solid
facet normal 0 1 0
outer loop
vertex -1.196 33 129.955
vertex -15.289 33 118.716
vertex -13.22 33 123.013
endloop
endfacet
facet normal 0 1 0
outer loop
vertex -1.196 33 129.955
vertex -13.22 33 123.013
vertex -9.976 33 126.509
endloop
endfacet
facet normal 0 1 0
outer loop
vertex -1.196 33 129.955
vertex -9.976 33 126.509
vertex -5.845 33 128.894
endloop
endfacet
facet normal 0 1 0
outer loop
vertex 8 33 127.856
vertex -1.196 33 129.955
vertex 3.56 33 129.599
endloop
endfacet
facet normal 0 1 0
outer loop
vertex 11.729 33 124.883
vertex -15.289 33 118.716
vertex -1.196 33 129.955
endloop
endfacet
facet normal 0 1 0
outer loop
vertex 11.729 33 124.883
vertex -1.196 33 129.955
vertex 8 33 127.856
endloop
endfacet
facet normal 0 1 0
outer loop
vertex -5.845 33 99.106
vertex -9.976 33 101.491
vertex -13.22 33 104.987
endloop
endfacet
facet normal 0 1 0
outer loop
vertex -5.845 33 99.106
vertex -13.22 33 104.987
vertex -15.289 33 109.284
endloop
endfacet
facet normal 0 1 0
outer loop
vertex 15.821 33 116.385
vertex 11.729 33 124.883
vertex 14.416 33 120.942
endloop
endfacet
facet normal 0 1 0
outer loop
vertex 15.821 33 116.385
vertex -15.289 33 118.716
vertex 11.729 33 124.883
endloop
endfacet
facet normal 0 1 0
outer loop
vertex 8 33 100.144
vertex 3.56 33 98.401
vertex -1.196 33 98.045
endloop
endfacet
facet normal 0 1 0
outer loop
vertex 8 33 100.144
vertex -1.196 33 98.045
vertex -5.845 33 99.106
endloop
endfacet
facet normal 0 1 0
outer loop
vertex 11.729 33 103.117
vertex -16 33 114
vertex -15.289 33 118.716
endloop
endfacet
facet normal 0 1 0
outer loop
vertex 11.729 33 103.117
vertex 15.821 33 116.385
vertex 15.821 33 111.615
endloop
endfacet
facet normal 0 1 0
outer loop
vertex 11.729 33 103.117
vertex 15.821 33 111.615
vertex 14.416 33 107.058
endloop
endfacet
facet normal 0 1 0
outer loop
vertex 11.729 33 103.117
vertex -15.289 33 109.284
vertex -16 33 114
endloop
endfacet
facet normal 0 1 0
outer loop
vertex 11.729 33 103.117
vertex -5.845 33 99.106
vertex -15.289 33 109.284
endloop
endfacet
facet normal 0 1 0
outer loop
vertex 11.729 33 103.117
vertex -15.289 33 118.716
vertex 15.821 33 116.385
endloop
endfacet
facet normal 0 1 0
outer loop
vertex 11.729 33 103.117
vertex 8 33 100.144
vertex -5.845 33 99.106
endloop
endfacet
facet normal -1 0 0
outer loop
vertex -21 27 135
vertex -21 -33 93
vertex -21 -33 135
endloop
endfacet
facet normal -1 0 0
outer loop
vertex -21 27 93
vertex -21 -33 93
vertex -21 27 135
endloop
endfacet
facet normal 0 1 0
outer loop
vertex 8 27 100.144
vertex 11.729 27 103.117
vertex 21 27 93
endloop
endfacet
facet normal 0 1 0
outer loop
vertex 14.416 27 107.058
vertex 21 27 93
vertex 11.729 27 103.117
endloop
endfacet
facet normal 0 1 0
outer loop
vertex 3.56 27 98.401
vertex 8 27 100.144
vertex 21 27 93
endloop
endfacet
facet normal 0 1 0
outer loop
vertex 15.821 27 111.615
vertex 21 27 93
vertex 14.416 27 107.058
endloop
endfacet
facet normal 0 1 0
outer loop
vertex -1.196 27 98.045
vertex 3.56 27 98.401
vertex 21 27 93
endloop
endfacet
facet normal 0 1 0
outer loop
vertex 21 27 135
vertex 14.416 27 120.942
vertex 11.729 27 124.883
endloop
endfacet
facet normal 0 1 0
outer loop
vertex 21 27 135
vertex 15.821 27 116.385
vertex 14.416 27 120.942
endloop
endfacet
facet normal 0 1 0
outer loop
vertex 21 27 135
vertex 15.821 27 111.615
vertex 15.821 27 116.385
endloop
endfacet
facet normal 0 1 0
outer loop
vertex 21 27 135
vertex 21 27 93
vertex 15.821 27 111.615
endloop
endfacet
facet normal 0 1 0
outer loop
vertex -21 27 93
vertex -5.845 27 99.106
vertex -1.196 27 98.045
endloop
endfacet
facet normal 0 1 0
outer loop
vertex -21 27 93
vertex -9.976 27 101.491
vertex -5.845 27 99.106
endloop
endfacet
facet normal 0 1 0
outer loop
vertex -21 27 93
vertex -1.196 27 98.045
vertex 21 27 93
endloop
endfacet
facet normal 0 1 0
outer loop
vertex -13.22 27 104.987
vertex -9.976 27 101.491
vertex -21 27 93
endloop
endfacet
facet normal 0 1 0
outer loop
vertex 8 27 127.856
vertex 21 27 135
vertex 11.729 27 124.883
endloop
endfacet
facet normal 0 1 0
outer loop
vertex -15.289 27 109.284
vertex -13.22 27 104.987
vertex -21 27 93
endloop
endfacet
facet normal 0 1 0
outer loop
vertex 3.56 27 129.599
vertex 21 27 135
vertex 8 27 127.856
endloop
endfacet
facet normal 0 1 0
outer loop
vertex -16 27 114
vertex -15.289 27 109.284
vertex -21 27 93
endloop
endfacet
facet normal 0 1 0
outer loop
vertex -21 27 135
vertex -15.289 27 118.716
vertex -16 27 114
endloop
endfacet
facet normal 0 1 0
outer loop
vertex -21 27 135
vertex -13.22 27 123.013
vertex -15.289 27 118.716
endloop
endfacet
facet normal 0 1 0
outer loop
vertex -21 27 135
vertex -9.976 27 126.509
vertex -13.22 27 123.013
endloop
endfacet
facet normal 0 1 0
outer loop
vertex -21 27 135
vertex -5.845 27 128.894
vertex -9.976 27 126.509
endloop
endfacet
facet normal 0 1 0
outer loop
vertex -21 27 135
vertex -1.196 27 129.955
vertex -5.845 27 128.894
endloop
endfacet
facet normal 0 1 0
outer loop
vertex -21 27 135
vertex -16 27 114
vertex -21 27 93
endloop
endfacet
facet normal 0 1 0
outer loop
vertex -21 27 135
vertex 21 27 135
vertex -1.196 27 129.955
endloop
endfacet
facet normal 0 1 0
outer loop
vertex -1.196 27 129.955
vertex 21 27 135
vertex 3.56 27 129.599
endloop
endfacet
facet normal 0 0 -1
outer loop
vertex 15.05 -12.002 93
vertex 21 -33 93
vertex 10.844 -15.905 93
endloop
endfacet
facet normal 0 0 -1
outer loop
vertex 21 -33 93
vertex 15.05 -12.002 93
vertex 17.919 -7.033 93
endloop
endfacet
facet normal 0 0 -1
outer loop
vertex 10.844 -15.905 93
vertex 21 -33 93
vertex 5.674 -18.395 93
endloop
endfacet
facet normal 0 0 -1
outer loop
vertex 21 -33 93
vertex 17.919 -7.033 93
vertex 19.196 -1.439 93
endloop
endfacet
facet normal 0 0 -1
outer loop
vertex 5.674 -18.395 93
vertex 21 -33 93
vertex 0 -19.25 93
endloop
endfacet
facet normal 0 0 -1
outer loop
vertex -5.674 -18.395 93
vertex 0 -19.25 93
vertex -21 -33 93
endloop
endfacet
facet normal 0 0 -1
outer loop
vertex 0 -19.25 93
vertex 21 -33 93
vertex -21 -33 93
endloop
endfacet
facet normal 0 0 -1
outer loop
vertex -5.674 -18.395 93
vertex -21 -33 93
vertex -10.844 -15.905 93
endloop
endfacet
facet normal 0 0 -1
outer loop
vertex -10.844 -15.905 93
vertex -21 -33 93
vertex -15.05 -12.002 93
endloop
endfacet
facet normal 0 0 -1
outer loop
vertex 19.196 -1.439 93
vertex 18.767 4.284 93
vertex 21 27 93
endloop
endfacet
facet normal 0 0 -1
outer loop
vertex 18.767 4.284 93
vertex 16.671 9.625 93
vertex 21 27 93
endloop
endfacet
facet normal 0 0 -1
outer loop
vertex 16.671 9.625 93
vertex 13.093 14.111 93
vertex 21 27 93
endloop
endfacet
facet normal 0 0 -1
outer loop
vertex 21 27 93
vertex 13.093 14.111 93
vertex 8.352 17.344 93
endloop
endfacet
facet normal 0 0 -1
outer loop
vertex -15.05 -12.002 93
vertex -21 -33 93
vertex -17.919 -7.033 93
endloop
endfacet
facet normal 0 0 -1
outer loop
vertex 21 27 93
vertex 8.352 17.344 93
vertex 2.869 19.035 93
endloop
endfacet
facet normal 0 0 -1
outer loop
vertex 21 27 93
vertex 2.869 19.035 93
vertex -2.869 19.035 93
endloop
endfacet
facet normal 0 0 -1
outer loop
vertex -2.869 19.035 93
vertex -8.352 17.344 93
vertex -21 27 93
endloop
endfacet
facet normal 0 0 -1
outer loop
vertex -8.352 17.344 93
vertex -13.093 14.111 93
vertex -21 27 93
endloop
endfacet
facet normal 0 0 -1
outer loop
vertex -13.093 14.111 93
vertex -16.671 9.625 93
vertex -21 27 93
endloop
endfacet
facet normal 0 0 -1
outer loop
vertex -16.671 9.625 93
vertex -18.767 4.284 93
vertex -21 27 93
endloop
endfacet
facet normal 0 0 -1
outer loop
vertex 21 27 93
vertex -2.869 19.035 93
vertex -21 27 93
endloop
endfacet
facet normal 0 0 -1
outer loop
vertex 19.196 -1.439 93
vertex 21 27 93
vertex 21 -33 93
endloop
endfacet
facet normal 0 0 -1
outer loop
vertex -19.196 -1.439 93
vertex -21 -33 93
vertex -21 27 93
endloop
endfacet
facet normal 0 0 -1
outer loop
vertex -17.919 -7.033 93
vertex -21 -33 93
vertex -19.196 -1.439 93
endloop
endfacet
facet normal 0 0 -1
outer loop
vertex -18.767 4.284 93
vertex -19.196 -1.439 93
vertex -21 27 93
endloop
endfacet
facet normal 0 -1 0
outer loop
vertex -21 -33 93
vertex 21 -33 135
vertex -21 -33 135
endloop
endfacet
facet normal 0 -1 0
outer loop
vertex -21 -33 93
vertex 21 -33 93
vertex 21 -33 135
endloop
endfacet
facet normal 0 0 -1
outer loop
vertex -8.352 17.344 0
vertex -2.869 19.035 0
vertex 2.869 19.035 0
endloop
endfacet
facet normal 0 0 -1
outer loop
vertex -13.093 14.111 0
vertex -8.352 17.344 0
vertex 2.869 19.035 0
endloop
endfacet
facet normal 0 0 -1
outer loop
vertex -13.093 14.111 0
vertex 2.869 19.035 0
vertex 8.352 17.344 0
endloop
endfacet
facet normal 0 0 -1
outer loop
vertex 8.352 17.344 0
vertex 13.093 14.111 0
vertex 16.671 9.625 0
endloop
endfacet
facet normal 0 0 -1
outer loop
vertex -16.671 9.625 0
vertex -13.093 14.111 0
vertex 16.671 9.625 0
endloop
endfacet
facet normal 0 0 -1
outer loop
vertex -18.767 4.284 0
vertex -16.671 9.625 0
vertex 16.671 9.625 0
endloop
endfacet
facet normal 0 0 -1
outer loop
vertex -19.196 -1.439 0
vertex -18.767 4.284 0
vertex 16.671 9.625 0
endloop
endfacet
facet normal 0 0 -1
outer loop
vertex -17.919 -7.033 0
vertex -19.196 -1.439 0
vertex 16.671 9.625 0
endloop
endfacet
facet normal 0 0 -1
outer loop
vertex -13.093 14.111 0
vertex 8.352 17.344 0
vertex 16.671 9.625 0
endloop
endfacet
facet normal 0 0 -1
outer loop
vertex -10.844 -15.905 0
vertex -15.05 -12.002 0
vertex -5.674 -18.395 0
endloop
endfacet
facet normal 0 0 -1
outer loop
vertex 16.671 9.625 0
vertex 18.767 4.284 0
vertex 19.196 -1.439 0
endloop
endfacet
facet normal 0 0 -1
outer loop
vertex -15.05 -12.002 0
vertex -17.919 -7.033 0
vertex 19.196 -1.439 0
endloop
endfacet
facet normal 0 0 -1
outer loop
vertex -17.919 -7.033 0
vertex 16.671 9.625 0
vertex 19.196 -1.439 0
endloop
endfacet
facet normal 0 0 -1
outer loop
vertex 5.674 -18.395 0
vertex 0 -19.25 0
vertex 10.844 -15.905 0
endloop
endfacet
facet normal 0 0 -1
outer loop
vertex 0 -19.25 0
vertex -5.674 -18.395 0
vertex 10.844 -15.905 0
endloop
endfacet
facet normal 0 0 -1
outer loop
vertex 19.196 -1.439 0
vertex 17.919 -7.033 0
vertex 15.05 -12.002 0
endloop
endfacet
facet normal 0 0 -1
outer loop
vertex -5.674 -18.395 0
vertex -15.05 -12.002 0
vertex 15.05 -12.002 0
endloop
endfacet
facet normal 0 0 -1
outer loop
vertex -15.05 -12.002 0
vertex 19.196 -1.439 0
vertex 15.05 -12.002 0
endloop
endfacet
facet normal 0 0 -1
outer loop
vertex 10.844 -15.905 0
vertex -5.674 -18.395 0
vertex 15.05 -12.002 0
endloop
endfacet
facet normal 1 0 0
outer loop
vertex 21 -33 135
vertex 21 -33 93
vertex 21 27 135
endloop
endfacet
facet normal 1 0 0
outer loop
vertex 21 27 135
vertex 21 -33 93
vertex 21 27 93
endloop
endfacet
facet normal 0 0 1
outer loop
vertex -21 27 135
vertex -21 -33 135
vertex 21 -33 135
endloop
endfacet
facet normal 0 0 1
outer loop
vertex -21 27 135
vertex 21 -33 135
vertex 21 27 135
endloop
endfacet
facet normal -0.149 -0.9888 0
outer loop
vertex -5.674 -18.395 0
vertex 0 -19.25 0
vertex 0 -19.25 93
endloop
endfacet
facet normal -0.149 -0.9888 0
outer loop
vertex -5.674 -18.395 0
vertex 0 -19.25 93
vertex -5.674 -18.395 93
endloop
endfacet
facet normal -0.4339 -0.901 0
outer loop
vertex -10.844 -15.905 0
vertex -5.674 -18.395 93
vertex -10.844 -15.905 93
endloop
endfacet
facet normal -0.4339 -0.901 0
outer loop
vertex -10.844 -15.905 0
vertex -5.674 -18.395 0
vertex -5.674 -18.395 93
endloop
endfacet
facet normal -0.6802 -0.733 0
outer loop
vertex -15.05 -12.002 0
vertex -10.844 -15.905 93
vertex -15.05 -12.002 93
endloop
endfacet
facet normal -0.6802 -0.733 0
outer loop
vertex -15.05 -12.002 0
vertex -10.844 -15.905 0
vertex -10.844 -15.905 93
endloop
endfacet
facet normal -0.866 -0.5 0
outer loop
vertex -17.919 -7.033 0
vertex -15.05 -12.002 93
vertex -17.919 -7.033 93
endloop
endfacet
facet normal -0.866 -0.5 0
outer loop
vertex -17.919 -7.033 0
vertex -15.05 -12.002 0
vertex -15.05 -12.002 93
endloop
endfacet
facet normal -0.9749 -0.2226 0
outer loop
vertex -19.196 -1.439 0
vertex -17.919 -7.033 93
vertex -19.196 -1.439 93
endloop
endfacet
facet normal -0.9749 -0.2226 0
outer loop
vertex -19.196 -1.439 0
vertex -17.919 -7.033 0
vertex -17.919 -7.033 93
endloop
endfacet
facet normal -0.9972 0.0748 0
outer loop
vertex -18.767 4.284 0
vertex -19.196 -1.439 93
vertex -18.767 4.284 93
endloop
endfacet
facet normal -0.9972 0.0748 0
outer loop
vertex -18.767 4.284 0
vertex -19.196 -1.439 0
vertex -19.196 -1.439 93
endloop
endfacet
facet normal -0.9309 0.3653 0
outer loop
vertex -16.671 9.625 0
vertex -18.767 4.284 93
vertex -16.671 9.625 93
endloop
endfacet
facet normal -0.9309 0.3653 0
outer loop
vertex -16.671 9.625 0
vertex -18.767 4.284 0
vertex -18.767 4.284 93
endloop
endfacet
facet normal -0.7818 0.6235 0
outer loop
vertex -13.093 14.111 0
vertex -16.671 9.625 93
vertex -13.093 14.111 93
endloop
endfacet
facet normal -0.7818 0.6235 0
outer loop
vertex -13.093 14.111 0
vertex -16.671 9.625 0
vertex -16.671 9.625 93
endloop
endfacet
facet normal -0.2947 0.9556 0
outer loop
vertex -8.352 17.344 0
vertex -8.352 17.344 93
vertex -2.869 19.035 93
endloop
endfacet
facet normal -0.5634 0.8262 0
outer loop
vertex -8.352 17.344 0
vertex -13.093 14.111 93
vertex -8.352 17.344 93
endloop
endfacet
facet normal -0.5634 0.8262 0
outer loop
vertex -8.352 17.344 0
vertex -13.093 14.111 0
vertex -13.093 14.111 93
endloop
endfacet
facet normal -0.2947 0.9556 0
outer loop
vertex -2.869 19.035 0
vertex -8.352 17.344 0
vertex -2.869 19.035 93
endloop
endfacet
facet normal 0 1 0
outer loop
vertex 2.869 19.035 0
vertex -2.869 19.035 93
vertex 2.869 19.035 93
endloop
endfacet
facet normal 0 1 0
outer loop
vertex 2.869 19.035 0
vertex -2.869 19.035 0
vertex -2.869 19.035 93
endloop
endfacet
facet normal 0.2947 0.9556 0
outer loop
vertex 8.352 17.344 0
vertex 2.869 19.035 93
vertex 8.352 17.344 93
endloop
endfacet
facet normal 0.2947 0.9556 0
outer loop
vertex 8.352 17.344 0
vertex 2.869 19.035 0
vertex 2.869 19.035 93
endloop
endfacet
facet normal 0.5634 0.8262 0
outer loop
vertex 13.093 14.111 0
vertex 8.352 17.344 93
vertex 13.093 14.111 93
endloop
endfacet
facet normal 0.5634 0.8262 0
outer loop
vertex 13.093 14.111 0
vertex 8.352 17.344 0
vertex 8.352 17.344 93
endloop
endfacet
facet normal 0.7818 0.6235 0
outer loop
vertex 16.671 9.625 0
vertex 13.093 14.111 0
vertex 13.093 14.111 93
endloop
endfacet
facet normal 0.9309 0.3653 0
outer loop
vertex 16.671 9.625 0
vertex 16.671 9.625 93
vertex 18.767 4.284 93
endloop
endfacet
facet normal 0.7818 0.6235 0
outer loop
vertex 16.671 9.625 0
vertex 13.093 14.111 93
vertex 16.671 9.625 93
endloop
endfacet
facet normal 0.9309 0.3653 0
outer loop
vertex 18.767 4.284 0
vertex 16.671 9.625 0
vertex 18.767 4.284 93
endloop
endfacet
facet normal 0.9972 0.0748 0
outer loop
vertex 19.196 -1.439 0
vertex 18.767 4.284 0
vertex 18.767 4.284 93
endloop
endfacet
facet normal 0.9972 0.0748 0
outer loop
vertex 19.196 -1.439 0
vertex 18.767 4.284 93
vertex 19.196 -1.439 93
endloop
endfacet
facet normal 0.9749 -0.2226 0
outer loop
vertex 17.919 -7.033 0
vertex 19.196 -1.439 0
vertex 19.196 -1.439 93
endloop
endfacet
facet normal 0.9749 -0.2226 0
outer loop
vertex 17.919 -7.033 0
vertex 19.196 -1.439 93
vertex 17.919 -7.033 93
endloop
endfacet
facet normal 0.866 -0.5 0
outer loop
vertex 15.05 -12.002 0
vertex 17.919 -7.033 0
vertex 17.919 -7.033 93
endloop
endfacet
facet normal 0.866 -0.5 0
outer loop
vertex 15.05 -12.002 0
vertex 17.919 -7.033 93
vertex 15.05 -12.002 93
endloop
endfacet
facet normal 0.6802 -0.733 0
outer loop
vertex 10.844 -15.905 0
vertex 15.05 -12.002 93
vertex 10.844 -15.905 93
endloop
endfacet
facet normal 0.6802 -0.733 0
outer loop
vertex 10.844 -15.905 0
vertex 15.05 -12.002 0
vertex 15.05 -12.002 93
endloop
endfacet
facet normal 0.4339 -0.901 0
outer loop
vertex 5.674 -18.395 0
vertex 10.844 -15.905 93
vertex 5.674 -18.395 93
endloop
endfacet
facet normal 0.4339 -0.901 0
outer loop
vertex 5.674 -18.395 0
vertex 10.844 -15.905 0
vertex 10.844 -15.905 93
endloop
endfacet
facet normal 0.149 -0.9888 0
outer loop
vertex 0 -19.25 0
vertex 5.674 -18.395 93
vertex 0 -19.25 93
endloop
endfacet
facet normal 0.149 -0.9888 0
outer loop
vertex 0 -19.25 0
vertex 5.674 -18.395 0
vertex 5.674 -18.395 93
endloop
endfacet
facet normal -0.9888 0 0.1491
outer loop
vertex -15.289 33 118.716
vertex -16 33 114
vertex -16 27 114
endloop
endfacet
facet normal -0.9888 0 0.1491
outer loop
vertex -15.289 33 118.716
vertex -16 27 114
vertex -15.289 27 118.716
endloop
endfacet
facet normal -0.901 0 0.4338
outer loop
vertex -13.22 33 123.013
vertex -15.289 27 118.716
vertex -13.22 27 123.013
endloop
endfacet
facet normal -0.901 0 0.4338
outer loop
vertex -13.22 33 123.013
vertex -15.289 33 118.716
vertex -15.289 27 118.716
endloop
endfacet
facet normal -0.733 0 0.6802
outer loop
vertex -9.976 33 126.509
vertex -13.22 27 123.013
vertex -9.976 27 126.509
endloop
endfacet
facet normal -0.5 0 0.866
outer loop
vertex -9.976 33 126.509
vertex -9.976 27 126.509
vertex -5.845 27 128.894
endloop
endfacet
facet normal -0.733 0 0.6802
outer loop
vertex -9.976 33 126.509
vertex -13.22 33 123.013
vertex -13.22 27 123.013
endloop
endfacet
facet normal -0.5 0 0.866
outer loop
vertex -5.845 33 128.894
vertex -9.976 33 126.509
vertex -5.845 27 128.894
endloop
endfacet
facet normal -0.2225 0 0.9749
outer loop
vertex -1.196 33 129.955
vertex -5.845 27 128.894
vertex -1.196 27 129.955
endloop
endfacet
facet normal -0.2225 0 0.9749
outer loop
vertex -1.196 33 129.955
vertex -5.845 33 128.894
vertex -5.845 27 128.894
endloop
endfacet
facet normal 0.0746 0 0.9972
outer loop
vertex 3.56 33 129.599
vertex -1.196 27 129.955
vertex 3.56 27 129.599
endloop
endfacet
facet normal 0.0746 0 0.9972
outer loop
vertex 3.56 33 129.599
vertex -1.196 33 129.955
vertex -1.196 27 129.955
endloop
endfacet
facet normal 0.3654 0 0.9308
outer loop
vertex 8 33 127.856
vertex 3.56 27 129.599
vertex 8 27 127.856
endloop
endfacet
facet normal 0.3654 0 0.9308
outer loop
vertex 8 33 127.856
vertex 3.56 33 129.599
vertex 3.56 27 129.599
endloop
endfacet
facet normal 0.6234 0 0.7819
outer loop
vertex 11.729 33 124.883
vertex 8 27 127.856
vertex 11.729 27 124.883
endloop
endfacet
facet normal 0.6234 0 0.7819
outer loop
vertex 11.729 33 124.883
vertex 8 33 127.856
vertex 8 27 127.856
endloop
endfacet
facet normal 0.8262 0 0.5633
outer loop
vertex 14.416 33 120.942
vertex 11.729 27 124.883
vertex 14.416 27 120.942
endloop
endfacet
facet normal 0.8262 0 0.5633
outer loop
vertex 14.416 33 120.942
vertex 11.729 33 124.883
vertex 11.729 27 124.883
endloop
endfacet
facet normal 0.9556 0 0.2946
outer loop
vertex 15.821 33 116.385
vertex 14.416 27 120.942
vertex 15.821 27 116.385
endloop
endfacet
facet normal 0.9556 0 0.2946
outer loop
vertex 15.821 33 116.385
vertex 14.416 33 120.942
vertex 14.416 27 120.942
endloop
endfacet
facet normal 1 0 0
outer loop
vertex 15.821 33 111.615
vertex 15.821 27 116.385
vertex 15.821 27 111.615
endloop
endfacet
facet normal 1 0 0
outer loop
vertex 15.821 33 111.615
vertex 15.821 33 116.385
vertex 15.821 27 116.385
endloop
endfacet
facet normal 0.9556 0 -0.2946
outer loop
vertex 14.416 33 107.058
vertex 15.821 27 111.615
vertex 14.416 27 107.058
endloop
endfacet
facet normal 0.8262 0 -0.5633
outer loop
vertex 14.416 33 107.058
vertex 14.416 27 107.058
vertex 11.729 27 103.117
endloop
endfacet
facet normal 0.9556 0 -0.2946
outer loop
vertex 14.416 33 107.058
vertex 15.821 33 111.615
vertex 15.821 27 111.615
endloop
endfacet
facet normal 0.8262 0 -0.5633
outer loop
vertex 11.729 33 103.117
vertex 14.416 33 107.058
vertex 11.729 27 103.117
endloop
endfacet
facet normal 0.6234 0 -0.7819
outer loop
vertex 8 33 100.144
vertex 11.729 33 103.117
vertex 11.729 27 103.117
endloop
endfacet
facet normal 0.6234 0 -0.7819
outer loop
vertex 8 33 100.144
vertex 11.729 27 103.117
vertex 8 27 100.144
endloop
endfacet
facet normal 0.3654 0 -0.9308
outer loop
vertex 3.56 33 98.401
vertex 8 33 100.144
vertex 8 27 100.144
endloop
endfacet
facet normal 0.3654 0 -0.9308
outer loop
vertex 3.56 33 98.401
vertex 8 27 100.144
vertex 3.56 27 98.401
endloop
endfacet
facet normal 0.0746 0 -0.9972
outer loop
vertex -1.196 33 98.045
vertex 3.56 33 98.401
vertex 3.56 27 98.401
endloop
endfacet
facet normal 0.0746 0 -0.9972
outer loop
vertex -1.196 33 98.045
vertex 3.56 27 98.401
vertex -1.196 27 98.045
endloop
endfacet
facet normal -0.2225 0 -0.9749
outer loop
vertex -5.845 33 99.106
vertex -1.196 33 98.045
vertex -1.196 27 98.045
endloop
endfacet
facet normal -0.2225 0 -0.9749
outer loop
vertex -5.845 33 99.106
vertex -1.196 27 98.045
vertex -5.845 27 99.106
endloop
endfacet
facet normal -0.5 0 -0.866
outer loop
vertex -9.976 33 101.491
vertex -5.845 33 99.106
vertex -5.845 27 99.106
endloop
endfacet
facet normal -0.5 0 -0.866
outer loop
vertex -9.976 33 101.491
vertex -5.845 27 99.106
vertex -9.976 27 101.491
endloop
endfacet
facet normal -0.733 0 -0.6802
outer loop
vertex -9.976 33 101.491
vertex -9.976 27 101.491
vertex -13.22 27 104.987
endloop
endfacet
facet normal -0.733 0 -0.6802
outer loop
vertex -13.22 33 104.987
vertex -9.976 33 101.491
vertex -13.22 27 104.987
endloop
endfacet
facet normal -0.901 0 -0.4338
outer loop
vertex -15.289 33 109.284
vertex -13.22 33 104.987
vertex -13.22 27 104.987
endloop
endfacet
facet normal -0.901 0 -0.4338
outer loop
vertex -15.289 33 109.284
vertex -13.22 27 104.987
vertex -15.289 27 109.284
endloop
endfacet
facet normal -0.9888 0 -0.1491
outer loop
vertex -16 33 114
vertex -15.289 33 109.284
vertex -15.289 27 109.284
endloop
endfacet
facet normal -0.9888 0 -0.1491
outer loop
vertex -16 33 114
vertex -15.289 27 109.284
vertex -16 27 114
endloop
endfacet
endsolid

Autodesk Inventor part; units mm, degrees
ref_plane "YZ Plane" through (0, 0, 0) normal (1, 0, 0) x (0, 1, 0)
ref_plane "XZ Plane" through (0, 0, 0) normal (0, 1, 0) x (-1, 0, 0)
ref_plane "XY Plane" through (0, 0, 0) normal (0, 0, 1) x (1, 0, 0)
sketch "Sketch1" plane through (0, 0, 0) normal (0, 1, 0) x (-1, 0, 0)
  circle A0 centre (0, 0) radius 19.25
  dimension "d0" = 38.5
extrude "Extrusion1" add sketch "Sketch1" along normal blind 93
sketch "Sketch2" plane through (0, 93, 0) normal (0, 1, 0) x (1, 0, 0)
  circle A0 centre (0, 0) radius 19.25 projected
  line L0 (0, 0) -> (33, 0) construction
  line L1 (33, 0) -> (0, 0) construction
  line L2 (0, 0) -> (0, 21) construction
  line L3 (0, 21) -> (33, 21)
  line L4 (33, 21) -> (33, 0)
  line L5 (0, -21) -> (33, -21)
  line L6 (33, -21) -> (33, 0)
  line L7 (0, 21) -> (-33, 21)
  line L8 (-33, 21) -> (-33, 0)
  line L9 (0, -21) -> (-33, -21)
  line L10 (-33, -21) -> (-33, 0)
  dimension "d4" = 33
  dimension "d5" = 21
extrude "Extrusion2" add sketch "Sketch2" along normal blind 42 contours A0 | L3 L4 L6 L5 L9 L10 L8 L7
sketch "Sketch3" plane through (33, 93, 21) normal (1, 0, 0) x (0, 0, -1)
  line L0 (0, 0) -> (42, 0) projected
  line L1 (42, 0) -> (42, 42) projected
  line L2 (0, 42) -> (42, 42) projected
  line L3 (0, 0) -> (0, 42) projected
  line L4 (0, 42) -> (42, 0) construction
  circle A0 centre (21, 21) radius 16
  point P0 (21, -93)
  dimension "d8" = 32
extrude "Extrusion3" cut sketch "Sketch3" against normal blind 6
move or copy body "Move Body2" bodies to move or copy 1 copy no rotation origin (0, 0, 0) rotation axis (1, 0, 0) rotation angle 90
move or copy body "Move Body4" bodies to move or copy 1 copy no rotation origin (0, 0, 0) rotation axis (0, 0, 1) rotation angle 90
properties part number "Neck_v2"
